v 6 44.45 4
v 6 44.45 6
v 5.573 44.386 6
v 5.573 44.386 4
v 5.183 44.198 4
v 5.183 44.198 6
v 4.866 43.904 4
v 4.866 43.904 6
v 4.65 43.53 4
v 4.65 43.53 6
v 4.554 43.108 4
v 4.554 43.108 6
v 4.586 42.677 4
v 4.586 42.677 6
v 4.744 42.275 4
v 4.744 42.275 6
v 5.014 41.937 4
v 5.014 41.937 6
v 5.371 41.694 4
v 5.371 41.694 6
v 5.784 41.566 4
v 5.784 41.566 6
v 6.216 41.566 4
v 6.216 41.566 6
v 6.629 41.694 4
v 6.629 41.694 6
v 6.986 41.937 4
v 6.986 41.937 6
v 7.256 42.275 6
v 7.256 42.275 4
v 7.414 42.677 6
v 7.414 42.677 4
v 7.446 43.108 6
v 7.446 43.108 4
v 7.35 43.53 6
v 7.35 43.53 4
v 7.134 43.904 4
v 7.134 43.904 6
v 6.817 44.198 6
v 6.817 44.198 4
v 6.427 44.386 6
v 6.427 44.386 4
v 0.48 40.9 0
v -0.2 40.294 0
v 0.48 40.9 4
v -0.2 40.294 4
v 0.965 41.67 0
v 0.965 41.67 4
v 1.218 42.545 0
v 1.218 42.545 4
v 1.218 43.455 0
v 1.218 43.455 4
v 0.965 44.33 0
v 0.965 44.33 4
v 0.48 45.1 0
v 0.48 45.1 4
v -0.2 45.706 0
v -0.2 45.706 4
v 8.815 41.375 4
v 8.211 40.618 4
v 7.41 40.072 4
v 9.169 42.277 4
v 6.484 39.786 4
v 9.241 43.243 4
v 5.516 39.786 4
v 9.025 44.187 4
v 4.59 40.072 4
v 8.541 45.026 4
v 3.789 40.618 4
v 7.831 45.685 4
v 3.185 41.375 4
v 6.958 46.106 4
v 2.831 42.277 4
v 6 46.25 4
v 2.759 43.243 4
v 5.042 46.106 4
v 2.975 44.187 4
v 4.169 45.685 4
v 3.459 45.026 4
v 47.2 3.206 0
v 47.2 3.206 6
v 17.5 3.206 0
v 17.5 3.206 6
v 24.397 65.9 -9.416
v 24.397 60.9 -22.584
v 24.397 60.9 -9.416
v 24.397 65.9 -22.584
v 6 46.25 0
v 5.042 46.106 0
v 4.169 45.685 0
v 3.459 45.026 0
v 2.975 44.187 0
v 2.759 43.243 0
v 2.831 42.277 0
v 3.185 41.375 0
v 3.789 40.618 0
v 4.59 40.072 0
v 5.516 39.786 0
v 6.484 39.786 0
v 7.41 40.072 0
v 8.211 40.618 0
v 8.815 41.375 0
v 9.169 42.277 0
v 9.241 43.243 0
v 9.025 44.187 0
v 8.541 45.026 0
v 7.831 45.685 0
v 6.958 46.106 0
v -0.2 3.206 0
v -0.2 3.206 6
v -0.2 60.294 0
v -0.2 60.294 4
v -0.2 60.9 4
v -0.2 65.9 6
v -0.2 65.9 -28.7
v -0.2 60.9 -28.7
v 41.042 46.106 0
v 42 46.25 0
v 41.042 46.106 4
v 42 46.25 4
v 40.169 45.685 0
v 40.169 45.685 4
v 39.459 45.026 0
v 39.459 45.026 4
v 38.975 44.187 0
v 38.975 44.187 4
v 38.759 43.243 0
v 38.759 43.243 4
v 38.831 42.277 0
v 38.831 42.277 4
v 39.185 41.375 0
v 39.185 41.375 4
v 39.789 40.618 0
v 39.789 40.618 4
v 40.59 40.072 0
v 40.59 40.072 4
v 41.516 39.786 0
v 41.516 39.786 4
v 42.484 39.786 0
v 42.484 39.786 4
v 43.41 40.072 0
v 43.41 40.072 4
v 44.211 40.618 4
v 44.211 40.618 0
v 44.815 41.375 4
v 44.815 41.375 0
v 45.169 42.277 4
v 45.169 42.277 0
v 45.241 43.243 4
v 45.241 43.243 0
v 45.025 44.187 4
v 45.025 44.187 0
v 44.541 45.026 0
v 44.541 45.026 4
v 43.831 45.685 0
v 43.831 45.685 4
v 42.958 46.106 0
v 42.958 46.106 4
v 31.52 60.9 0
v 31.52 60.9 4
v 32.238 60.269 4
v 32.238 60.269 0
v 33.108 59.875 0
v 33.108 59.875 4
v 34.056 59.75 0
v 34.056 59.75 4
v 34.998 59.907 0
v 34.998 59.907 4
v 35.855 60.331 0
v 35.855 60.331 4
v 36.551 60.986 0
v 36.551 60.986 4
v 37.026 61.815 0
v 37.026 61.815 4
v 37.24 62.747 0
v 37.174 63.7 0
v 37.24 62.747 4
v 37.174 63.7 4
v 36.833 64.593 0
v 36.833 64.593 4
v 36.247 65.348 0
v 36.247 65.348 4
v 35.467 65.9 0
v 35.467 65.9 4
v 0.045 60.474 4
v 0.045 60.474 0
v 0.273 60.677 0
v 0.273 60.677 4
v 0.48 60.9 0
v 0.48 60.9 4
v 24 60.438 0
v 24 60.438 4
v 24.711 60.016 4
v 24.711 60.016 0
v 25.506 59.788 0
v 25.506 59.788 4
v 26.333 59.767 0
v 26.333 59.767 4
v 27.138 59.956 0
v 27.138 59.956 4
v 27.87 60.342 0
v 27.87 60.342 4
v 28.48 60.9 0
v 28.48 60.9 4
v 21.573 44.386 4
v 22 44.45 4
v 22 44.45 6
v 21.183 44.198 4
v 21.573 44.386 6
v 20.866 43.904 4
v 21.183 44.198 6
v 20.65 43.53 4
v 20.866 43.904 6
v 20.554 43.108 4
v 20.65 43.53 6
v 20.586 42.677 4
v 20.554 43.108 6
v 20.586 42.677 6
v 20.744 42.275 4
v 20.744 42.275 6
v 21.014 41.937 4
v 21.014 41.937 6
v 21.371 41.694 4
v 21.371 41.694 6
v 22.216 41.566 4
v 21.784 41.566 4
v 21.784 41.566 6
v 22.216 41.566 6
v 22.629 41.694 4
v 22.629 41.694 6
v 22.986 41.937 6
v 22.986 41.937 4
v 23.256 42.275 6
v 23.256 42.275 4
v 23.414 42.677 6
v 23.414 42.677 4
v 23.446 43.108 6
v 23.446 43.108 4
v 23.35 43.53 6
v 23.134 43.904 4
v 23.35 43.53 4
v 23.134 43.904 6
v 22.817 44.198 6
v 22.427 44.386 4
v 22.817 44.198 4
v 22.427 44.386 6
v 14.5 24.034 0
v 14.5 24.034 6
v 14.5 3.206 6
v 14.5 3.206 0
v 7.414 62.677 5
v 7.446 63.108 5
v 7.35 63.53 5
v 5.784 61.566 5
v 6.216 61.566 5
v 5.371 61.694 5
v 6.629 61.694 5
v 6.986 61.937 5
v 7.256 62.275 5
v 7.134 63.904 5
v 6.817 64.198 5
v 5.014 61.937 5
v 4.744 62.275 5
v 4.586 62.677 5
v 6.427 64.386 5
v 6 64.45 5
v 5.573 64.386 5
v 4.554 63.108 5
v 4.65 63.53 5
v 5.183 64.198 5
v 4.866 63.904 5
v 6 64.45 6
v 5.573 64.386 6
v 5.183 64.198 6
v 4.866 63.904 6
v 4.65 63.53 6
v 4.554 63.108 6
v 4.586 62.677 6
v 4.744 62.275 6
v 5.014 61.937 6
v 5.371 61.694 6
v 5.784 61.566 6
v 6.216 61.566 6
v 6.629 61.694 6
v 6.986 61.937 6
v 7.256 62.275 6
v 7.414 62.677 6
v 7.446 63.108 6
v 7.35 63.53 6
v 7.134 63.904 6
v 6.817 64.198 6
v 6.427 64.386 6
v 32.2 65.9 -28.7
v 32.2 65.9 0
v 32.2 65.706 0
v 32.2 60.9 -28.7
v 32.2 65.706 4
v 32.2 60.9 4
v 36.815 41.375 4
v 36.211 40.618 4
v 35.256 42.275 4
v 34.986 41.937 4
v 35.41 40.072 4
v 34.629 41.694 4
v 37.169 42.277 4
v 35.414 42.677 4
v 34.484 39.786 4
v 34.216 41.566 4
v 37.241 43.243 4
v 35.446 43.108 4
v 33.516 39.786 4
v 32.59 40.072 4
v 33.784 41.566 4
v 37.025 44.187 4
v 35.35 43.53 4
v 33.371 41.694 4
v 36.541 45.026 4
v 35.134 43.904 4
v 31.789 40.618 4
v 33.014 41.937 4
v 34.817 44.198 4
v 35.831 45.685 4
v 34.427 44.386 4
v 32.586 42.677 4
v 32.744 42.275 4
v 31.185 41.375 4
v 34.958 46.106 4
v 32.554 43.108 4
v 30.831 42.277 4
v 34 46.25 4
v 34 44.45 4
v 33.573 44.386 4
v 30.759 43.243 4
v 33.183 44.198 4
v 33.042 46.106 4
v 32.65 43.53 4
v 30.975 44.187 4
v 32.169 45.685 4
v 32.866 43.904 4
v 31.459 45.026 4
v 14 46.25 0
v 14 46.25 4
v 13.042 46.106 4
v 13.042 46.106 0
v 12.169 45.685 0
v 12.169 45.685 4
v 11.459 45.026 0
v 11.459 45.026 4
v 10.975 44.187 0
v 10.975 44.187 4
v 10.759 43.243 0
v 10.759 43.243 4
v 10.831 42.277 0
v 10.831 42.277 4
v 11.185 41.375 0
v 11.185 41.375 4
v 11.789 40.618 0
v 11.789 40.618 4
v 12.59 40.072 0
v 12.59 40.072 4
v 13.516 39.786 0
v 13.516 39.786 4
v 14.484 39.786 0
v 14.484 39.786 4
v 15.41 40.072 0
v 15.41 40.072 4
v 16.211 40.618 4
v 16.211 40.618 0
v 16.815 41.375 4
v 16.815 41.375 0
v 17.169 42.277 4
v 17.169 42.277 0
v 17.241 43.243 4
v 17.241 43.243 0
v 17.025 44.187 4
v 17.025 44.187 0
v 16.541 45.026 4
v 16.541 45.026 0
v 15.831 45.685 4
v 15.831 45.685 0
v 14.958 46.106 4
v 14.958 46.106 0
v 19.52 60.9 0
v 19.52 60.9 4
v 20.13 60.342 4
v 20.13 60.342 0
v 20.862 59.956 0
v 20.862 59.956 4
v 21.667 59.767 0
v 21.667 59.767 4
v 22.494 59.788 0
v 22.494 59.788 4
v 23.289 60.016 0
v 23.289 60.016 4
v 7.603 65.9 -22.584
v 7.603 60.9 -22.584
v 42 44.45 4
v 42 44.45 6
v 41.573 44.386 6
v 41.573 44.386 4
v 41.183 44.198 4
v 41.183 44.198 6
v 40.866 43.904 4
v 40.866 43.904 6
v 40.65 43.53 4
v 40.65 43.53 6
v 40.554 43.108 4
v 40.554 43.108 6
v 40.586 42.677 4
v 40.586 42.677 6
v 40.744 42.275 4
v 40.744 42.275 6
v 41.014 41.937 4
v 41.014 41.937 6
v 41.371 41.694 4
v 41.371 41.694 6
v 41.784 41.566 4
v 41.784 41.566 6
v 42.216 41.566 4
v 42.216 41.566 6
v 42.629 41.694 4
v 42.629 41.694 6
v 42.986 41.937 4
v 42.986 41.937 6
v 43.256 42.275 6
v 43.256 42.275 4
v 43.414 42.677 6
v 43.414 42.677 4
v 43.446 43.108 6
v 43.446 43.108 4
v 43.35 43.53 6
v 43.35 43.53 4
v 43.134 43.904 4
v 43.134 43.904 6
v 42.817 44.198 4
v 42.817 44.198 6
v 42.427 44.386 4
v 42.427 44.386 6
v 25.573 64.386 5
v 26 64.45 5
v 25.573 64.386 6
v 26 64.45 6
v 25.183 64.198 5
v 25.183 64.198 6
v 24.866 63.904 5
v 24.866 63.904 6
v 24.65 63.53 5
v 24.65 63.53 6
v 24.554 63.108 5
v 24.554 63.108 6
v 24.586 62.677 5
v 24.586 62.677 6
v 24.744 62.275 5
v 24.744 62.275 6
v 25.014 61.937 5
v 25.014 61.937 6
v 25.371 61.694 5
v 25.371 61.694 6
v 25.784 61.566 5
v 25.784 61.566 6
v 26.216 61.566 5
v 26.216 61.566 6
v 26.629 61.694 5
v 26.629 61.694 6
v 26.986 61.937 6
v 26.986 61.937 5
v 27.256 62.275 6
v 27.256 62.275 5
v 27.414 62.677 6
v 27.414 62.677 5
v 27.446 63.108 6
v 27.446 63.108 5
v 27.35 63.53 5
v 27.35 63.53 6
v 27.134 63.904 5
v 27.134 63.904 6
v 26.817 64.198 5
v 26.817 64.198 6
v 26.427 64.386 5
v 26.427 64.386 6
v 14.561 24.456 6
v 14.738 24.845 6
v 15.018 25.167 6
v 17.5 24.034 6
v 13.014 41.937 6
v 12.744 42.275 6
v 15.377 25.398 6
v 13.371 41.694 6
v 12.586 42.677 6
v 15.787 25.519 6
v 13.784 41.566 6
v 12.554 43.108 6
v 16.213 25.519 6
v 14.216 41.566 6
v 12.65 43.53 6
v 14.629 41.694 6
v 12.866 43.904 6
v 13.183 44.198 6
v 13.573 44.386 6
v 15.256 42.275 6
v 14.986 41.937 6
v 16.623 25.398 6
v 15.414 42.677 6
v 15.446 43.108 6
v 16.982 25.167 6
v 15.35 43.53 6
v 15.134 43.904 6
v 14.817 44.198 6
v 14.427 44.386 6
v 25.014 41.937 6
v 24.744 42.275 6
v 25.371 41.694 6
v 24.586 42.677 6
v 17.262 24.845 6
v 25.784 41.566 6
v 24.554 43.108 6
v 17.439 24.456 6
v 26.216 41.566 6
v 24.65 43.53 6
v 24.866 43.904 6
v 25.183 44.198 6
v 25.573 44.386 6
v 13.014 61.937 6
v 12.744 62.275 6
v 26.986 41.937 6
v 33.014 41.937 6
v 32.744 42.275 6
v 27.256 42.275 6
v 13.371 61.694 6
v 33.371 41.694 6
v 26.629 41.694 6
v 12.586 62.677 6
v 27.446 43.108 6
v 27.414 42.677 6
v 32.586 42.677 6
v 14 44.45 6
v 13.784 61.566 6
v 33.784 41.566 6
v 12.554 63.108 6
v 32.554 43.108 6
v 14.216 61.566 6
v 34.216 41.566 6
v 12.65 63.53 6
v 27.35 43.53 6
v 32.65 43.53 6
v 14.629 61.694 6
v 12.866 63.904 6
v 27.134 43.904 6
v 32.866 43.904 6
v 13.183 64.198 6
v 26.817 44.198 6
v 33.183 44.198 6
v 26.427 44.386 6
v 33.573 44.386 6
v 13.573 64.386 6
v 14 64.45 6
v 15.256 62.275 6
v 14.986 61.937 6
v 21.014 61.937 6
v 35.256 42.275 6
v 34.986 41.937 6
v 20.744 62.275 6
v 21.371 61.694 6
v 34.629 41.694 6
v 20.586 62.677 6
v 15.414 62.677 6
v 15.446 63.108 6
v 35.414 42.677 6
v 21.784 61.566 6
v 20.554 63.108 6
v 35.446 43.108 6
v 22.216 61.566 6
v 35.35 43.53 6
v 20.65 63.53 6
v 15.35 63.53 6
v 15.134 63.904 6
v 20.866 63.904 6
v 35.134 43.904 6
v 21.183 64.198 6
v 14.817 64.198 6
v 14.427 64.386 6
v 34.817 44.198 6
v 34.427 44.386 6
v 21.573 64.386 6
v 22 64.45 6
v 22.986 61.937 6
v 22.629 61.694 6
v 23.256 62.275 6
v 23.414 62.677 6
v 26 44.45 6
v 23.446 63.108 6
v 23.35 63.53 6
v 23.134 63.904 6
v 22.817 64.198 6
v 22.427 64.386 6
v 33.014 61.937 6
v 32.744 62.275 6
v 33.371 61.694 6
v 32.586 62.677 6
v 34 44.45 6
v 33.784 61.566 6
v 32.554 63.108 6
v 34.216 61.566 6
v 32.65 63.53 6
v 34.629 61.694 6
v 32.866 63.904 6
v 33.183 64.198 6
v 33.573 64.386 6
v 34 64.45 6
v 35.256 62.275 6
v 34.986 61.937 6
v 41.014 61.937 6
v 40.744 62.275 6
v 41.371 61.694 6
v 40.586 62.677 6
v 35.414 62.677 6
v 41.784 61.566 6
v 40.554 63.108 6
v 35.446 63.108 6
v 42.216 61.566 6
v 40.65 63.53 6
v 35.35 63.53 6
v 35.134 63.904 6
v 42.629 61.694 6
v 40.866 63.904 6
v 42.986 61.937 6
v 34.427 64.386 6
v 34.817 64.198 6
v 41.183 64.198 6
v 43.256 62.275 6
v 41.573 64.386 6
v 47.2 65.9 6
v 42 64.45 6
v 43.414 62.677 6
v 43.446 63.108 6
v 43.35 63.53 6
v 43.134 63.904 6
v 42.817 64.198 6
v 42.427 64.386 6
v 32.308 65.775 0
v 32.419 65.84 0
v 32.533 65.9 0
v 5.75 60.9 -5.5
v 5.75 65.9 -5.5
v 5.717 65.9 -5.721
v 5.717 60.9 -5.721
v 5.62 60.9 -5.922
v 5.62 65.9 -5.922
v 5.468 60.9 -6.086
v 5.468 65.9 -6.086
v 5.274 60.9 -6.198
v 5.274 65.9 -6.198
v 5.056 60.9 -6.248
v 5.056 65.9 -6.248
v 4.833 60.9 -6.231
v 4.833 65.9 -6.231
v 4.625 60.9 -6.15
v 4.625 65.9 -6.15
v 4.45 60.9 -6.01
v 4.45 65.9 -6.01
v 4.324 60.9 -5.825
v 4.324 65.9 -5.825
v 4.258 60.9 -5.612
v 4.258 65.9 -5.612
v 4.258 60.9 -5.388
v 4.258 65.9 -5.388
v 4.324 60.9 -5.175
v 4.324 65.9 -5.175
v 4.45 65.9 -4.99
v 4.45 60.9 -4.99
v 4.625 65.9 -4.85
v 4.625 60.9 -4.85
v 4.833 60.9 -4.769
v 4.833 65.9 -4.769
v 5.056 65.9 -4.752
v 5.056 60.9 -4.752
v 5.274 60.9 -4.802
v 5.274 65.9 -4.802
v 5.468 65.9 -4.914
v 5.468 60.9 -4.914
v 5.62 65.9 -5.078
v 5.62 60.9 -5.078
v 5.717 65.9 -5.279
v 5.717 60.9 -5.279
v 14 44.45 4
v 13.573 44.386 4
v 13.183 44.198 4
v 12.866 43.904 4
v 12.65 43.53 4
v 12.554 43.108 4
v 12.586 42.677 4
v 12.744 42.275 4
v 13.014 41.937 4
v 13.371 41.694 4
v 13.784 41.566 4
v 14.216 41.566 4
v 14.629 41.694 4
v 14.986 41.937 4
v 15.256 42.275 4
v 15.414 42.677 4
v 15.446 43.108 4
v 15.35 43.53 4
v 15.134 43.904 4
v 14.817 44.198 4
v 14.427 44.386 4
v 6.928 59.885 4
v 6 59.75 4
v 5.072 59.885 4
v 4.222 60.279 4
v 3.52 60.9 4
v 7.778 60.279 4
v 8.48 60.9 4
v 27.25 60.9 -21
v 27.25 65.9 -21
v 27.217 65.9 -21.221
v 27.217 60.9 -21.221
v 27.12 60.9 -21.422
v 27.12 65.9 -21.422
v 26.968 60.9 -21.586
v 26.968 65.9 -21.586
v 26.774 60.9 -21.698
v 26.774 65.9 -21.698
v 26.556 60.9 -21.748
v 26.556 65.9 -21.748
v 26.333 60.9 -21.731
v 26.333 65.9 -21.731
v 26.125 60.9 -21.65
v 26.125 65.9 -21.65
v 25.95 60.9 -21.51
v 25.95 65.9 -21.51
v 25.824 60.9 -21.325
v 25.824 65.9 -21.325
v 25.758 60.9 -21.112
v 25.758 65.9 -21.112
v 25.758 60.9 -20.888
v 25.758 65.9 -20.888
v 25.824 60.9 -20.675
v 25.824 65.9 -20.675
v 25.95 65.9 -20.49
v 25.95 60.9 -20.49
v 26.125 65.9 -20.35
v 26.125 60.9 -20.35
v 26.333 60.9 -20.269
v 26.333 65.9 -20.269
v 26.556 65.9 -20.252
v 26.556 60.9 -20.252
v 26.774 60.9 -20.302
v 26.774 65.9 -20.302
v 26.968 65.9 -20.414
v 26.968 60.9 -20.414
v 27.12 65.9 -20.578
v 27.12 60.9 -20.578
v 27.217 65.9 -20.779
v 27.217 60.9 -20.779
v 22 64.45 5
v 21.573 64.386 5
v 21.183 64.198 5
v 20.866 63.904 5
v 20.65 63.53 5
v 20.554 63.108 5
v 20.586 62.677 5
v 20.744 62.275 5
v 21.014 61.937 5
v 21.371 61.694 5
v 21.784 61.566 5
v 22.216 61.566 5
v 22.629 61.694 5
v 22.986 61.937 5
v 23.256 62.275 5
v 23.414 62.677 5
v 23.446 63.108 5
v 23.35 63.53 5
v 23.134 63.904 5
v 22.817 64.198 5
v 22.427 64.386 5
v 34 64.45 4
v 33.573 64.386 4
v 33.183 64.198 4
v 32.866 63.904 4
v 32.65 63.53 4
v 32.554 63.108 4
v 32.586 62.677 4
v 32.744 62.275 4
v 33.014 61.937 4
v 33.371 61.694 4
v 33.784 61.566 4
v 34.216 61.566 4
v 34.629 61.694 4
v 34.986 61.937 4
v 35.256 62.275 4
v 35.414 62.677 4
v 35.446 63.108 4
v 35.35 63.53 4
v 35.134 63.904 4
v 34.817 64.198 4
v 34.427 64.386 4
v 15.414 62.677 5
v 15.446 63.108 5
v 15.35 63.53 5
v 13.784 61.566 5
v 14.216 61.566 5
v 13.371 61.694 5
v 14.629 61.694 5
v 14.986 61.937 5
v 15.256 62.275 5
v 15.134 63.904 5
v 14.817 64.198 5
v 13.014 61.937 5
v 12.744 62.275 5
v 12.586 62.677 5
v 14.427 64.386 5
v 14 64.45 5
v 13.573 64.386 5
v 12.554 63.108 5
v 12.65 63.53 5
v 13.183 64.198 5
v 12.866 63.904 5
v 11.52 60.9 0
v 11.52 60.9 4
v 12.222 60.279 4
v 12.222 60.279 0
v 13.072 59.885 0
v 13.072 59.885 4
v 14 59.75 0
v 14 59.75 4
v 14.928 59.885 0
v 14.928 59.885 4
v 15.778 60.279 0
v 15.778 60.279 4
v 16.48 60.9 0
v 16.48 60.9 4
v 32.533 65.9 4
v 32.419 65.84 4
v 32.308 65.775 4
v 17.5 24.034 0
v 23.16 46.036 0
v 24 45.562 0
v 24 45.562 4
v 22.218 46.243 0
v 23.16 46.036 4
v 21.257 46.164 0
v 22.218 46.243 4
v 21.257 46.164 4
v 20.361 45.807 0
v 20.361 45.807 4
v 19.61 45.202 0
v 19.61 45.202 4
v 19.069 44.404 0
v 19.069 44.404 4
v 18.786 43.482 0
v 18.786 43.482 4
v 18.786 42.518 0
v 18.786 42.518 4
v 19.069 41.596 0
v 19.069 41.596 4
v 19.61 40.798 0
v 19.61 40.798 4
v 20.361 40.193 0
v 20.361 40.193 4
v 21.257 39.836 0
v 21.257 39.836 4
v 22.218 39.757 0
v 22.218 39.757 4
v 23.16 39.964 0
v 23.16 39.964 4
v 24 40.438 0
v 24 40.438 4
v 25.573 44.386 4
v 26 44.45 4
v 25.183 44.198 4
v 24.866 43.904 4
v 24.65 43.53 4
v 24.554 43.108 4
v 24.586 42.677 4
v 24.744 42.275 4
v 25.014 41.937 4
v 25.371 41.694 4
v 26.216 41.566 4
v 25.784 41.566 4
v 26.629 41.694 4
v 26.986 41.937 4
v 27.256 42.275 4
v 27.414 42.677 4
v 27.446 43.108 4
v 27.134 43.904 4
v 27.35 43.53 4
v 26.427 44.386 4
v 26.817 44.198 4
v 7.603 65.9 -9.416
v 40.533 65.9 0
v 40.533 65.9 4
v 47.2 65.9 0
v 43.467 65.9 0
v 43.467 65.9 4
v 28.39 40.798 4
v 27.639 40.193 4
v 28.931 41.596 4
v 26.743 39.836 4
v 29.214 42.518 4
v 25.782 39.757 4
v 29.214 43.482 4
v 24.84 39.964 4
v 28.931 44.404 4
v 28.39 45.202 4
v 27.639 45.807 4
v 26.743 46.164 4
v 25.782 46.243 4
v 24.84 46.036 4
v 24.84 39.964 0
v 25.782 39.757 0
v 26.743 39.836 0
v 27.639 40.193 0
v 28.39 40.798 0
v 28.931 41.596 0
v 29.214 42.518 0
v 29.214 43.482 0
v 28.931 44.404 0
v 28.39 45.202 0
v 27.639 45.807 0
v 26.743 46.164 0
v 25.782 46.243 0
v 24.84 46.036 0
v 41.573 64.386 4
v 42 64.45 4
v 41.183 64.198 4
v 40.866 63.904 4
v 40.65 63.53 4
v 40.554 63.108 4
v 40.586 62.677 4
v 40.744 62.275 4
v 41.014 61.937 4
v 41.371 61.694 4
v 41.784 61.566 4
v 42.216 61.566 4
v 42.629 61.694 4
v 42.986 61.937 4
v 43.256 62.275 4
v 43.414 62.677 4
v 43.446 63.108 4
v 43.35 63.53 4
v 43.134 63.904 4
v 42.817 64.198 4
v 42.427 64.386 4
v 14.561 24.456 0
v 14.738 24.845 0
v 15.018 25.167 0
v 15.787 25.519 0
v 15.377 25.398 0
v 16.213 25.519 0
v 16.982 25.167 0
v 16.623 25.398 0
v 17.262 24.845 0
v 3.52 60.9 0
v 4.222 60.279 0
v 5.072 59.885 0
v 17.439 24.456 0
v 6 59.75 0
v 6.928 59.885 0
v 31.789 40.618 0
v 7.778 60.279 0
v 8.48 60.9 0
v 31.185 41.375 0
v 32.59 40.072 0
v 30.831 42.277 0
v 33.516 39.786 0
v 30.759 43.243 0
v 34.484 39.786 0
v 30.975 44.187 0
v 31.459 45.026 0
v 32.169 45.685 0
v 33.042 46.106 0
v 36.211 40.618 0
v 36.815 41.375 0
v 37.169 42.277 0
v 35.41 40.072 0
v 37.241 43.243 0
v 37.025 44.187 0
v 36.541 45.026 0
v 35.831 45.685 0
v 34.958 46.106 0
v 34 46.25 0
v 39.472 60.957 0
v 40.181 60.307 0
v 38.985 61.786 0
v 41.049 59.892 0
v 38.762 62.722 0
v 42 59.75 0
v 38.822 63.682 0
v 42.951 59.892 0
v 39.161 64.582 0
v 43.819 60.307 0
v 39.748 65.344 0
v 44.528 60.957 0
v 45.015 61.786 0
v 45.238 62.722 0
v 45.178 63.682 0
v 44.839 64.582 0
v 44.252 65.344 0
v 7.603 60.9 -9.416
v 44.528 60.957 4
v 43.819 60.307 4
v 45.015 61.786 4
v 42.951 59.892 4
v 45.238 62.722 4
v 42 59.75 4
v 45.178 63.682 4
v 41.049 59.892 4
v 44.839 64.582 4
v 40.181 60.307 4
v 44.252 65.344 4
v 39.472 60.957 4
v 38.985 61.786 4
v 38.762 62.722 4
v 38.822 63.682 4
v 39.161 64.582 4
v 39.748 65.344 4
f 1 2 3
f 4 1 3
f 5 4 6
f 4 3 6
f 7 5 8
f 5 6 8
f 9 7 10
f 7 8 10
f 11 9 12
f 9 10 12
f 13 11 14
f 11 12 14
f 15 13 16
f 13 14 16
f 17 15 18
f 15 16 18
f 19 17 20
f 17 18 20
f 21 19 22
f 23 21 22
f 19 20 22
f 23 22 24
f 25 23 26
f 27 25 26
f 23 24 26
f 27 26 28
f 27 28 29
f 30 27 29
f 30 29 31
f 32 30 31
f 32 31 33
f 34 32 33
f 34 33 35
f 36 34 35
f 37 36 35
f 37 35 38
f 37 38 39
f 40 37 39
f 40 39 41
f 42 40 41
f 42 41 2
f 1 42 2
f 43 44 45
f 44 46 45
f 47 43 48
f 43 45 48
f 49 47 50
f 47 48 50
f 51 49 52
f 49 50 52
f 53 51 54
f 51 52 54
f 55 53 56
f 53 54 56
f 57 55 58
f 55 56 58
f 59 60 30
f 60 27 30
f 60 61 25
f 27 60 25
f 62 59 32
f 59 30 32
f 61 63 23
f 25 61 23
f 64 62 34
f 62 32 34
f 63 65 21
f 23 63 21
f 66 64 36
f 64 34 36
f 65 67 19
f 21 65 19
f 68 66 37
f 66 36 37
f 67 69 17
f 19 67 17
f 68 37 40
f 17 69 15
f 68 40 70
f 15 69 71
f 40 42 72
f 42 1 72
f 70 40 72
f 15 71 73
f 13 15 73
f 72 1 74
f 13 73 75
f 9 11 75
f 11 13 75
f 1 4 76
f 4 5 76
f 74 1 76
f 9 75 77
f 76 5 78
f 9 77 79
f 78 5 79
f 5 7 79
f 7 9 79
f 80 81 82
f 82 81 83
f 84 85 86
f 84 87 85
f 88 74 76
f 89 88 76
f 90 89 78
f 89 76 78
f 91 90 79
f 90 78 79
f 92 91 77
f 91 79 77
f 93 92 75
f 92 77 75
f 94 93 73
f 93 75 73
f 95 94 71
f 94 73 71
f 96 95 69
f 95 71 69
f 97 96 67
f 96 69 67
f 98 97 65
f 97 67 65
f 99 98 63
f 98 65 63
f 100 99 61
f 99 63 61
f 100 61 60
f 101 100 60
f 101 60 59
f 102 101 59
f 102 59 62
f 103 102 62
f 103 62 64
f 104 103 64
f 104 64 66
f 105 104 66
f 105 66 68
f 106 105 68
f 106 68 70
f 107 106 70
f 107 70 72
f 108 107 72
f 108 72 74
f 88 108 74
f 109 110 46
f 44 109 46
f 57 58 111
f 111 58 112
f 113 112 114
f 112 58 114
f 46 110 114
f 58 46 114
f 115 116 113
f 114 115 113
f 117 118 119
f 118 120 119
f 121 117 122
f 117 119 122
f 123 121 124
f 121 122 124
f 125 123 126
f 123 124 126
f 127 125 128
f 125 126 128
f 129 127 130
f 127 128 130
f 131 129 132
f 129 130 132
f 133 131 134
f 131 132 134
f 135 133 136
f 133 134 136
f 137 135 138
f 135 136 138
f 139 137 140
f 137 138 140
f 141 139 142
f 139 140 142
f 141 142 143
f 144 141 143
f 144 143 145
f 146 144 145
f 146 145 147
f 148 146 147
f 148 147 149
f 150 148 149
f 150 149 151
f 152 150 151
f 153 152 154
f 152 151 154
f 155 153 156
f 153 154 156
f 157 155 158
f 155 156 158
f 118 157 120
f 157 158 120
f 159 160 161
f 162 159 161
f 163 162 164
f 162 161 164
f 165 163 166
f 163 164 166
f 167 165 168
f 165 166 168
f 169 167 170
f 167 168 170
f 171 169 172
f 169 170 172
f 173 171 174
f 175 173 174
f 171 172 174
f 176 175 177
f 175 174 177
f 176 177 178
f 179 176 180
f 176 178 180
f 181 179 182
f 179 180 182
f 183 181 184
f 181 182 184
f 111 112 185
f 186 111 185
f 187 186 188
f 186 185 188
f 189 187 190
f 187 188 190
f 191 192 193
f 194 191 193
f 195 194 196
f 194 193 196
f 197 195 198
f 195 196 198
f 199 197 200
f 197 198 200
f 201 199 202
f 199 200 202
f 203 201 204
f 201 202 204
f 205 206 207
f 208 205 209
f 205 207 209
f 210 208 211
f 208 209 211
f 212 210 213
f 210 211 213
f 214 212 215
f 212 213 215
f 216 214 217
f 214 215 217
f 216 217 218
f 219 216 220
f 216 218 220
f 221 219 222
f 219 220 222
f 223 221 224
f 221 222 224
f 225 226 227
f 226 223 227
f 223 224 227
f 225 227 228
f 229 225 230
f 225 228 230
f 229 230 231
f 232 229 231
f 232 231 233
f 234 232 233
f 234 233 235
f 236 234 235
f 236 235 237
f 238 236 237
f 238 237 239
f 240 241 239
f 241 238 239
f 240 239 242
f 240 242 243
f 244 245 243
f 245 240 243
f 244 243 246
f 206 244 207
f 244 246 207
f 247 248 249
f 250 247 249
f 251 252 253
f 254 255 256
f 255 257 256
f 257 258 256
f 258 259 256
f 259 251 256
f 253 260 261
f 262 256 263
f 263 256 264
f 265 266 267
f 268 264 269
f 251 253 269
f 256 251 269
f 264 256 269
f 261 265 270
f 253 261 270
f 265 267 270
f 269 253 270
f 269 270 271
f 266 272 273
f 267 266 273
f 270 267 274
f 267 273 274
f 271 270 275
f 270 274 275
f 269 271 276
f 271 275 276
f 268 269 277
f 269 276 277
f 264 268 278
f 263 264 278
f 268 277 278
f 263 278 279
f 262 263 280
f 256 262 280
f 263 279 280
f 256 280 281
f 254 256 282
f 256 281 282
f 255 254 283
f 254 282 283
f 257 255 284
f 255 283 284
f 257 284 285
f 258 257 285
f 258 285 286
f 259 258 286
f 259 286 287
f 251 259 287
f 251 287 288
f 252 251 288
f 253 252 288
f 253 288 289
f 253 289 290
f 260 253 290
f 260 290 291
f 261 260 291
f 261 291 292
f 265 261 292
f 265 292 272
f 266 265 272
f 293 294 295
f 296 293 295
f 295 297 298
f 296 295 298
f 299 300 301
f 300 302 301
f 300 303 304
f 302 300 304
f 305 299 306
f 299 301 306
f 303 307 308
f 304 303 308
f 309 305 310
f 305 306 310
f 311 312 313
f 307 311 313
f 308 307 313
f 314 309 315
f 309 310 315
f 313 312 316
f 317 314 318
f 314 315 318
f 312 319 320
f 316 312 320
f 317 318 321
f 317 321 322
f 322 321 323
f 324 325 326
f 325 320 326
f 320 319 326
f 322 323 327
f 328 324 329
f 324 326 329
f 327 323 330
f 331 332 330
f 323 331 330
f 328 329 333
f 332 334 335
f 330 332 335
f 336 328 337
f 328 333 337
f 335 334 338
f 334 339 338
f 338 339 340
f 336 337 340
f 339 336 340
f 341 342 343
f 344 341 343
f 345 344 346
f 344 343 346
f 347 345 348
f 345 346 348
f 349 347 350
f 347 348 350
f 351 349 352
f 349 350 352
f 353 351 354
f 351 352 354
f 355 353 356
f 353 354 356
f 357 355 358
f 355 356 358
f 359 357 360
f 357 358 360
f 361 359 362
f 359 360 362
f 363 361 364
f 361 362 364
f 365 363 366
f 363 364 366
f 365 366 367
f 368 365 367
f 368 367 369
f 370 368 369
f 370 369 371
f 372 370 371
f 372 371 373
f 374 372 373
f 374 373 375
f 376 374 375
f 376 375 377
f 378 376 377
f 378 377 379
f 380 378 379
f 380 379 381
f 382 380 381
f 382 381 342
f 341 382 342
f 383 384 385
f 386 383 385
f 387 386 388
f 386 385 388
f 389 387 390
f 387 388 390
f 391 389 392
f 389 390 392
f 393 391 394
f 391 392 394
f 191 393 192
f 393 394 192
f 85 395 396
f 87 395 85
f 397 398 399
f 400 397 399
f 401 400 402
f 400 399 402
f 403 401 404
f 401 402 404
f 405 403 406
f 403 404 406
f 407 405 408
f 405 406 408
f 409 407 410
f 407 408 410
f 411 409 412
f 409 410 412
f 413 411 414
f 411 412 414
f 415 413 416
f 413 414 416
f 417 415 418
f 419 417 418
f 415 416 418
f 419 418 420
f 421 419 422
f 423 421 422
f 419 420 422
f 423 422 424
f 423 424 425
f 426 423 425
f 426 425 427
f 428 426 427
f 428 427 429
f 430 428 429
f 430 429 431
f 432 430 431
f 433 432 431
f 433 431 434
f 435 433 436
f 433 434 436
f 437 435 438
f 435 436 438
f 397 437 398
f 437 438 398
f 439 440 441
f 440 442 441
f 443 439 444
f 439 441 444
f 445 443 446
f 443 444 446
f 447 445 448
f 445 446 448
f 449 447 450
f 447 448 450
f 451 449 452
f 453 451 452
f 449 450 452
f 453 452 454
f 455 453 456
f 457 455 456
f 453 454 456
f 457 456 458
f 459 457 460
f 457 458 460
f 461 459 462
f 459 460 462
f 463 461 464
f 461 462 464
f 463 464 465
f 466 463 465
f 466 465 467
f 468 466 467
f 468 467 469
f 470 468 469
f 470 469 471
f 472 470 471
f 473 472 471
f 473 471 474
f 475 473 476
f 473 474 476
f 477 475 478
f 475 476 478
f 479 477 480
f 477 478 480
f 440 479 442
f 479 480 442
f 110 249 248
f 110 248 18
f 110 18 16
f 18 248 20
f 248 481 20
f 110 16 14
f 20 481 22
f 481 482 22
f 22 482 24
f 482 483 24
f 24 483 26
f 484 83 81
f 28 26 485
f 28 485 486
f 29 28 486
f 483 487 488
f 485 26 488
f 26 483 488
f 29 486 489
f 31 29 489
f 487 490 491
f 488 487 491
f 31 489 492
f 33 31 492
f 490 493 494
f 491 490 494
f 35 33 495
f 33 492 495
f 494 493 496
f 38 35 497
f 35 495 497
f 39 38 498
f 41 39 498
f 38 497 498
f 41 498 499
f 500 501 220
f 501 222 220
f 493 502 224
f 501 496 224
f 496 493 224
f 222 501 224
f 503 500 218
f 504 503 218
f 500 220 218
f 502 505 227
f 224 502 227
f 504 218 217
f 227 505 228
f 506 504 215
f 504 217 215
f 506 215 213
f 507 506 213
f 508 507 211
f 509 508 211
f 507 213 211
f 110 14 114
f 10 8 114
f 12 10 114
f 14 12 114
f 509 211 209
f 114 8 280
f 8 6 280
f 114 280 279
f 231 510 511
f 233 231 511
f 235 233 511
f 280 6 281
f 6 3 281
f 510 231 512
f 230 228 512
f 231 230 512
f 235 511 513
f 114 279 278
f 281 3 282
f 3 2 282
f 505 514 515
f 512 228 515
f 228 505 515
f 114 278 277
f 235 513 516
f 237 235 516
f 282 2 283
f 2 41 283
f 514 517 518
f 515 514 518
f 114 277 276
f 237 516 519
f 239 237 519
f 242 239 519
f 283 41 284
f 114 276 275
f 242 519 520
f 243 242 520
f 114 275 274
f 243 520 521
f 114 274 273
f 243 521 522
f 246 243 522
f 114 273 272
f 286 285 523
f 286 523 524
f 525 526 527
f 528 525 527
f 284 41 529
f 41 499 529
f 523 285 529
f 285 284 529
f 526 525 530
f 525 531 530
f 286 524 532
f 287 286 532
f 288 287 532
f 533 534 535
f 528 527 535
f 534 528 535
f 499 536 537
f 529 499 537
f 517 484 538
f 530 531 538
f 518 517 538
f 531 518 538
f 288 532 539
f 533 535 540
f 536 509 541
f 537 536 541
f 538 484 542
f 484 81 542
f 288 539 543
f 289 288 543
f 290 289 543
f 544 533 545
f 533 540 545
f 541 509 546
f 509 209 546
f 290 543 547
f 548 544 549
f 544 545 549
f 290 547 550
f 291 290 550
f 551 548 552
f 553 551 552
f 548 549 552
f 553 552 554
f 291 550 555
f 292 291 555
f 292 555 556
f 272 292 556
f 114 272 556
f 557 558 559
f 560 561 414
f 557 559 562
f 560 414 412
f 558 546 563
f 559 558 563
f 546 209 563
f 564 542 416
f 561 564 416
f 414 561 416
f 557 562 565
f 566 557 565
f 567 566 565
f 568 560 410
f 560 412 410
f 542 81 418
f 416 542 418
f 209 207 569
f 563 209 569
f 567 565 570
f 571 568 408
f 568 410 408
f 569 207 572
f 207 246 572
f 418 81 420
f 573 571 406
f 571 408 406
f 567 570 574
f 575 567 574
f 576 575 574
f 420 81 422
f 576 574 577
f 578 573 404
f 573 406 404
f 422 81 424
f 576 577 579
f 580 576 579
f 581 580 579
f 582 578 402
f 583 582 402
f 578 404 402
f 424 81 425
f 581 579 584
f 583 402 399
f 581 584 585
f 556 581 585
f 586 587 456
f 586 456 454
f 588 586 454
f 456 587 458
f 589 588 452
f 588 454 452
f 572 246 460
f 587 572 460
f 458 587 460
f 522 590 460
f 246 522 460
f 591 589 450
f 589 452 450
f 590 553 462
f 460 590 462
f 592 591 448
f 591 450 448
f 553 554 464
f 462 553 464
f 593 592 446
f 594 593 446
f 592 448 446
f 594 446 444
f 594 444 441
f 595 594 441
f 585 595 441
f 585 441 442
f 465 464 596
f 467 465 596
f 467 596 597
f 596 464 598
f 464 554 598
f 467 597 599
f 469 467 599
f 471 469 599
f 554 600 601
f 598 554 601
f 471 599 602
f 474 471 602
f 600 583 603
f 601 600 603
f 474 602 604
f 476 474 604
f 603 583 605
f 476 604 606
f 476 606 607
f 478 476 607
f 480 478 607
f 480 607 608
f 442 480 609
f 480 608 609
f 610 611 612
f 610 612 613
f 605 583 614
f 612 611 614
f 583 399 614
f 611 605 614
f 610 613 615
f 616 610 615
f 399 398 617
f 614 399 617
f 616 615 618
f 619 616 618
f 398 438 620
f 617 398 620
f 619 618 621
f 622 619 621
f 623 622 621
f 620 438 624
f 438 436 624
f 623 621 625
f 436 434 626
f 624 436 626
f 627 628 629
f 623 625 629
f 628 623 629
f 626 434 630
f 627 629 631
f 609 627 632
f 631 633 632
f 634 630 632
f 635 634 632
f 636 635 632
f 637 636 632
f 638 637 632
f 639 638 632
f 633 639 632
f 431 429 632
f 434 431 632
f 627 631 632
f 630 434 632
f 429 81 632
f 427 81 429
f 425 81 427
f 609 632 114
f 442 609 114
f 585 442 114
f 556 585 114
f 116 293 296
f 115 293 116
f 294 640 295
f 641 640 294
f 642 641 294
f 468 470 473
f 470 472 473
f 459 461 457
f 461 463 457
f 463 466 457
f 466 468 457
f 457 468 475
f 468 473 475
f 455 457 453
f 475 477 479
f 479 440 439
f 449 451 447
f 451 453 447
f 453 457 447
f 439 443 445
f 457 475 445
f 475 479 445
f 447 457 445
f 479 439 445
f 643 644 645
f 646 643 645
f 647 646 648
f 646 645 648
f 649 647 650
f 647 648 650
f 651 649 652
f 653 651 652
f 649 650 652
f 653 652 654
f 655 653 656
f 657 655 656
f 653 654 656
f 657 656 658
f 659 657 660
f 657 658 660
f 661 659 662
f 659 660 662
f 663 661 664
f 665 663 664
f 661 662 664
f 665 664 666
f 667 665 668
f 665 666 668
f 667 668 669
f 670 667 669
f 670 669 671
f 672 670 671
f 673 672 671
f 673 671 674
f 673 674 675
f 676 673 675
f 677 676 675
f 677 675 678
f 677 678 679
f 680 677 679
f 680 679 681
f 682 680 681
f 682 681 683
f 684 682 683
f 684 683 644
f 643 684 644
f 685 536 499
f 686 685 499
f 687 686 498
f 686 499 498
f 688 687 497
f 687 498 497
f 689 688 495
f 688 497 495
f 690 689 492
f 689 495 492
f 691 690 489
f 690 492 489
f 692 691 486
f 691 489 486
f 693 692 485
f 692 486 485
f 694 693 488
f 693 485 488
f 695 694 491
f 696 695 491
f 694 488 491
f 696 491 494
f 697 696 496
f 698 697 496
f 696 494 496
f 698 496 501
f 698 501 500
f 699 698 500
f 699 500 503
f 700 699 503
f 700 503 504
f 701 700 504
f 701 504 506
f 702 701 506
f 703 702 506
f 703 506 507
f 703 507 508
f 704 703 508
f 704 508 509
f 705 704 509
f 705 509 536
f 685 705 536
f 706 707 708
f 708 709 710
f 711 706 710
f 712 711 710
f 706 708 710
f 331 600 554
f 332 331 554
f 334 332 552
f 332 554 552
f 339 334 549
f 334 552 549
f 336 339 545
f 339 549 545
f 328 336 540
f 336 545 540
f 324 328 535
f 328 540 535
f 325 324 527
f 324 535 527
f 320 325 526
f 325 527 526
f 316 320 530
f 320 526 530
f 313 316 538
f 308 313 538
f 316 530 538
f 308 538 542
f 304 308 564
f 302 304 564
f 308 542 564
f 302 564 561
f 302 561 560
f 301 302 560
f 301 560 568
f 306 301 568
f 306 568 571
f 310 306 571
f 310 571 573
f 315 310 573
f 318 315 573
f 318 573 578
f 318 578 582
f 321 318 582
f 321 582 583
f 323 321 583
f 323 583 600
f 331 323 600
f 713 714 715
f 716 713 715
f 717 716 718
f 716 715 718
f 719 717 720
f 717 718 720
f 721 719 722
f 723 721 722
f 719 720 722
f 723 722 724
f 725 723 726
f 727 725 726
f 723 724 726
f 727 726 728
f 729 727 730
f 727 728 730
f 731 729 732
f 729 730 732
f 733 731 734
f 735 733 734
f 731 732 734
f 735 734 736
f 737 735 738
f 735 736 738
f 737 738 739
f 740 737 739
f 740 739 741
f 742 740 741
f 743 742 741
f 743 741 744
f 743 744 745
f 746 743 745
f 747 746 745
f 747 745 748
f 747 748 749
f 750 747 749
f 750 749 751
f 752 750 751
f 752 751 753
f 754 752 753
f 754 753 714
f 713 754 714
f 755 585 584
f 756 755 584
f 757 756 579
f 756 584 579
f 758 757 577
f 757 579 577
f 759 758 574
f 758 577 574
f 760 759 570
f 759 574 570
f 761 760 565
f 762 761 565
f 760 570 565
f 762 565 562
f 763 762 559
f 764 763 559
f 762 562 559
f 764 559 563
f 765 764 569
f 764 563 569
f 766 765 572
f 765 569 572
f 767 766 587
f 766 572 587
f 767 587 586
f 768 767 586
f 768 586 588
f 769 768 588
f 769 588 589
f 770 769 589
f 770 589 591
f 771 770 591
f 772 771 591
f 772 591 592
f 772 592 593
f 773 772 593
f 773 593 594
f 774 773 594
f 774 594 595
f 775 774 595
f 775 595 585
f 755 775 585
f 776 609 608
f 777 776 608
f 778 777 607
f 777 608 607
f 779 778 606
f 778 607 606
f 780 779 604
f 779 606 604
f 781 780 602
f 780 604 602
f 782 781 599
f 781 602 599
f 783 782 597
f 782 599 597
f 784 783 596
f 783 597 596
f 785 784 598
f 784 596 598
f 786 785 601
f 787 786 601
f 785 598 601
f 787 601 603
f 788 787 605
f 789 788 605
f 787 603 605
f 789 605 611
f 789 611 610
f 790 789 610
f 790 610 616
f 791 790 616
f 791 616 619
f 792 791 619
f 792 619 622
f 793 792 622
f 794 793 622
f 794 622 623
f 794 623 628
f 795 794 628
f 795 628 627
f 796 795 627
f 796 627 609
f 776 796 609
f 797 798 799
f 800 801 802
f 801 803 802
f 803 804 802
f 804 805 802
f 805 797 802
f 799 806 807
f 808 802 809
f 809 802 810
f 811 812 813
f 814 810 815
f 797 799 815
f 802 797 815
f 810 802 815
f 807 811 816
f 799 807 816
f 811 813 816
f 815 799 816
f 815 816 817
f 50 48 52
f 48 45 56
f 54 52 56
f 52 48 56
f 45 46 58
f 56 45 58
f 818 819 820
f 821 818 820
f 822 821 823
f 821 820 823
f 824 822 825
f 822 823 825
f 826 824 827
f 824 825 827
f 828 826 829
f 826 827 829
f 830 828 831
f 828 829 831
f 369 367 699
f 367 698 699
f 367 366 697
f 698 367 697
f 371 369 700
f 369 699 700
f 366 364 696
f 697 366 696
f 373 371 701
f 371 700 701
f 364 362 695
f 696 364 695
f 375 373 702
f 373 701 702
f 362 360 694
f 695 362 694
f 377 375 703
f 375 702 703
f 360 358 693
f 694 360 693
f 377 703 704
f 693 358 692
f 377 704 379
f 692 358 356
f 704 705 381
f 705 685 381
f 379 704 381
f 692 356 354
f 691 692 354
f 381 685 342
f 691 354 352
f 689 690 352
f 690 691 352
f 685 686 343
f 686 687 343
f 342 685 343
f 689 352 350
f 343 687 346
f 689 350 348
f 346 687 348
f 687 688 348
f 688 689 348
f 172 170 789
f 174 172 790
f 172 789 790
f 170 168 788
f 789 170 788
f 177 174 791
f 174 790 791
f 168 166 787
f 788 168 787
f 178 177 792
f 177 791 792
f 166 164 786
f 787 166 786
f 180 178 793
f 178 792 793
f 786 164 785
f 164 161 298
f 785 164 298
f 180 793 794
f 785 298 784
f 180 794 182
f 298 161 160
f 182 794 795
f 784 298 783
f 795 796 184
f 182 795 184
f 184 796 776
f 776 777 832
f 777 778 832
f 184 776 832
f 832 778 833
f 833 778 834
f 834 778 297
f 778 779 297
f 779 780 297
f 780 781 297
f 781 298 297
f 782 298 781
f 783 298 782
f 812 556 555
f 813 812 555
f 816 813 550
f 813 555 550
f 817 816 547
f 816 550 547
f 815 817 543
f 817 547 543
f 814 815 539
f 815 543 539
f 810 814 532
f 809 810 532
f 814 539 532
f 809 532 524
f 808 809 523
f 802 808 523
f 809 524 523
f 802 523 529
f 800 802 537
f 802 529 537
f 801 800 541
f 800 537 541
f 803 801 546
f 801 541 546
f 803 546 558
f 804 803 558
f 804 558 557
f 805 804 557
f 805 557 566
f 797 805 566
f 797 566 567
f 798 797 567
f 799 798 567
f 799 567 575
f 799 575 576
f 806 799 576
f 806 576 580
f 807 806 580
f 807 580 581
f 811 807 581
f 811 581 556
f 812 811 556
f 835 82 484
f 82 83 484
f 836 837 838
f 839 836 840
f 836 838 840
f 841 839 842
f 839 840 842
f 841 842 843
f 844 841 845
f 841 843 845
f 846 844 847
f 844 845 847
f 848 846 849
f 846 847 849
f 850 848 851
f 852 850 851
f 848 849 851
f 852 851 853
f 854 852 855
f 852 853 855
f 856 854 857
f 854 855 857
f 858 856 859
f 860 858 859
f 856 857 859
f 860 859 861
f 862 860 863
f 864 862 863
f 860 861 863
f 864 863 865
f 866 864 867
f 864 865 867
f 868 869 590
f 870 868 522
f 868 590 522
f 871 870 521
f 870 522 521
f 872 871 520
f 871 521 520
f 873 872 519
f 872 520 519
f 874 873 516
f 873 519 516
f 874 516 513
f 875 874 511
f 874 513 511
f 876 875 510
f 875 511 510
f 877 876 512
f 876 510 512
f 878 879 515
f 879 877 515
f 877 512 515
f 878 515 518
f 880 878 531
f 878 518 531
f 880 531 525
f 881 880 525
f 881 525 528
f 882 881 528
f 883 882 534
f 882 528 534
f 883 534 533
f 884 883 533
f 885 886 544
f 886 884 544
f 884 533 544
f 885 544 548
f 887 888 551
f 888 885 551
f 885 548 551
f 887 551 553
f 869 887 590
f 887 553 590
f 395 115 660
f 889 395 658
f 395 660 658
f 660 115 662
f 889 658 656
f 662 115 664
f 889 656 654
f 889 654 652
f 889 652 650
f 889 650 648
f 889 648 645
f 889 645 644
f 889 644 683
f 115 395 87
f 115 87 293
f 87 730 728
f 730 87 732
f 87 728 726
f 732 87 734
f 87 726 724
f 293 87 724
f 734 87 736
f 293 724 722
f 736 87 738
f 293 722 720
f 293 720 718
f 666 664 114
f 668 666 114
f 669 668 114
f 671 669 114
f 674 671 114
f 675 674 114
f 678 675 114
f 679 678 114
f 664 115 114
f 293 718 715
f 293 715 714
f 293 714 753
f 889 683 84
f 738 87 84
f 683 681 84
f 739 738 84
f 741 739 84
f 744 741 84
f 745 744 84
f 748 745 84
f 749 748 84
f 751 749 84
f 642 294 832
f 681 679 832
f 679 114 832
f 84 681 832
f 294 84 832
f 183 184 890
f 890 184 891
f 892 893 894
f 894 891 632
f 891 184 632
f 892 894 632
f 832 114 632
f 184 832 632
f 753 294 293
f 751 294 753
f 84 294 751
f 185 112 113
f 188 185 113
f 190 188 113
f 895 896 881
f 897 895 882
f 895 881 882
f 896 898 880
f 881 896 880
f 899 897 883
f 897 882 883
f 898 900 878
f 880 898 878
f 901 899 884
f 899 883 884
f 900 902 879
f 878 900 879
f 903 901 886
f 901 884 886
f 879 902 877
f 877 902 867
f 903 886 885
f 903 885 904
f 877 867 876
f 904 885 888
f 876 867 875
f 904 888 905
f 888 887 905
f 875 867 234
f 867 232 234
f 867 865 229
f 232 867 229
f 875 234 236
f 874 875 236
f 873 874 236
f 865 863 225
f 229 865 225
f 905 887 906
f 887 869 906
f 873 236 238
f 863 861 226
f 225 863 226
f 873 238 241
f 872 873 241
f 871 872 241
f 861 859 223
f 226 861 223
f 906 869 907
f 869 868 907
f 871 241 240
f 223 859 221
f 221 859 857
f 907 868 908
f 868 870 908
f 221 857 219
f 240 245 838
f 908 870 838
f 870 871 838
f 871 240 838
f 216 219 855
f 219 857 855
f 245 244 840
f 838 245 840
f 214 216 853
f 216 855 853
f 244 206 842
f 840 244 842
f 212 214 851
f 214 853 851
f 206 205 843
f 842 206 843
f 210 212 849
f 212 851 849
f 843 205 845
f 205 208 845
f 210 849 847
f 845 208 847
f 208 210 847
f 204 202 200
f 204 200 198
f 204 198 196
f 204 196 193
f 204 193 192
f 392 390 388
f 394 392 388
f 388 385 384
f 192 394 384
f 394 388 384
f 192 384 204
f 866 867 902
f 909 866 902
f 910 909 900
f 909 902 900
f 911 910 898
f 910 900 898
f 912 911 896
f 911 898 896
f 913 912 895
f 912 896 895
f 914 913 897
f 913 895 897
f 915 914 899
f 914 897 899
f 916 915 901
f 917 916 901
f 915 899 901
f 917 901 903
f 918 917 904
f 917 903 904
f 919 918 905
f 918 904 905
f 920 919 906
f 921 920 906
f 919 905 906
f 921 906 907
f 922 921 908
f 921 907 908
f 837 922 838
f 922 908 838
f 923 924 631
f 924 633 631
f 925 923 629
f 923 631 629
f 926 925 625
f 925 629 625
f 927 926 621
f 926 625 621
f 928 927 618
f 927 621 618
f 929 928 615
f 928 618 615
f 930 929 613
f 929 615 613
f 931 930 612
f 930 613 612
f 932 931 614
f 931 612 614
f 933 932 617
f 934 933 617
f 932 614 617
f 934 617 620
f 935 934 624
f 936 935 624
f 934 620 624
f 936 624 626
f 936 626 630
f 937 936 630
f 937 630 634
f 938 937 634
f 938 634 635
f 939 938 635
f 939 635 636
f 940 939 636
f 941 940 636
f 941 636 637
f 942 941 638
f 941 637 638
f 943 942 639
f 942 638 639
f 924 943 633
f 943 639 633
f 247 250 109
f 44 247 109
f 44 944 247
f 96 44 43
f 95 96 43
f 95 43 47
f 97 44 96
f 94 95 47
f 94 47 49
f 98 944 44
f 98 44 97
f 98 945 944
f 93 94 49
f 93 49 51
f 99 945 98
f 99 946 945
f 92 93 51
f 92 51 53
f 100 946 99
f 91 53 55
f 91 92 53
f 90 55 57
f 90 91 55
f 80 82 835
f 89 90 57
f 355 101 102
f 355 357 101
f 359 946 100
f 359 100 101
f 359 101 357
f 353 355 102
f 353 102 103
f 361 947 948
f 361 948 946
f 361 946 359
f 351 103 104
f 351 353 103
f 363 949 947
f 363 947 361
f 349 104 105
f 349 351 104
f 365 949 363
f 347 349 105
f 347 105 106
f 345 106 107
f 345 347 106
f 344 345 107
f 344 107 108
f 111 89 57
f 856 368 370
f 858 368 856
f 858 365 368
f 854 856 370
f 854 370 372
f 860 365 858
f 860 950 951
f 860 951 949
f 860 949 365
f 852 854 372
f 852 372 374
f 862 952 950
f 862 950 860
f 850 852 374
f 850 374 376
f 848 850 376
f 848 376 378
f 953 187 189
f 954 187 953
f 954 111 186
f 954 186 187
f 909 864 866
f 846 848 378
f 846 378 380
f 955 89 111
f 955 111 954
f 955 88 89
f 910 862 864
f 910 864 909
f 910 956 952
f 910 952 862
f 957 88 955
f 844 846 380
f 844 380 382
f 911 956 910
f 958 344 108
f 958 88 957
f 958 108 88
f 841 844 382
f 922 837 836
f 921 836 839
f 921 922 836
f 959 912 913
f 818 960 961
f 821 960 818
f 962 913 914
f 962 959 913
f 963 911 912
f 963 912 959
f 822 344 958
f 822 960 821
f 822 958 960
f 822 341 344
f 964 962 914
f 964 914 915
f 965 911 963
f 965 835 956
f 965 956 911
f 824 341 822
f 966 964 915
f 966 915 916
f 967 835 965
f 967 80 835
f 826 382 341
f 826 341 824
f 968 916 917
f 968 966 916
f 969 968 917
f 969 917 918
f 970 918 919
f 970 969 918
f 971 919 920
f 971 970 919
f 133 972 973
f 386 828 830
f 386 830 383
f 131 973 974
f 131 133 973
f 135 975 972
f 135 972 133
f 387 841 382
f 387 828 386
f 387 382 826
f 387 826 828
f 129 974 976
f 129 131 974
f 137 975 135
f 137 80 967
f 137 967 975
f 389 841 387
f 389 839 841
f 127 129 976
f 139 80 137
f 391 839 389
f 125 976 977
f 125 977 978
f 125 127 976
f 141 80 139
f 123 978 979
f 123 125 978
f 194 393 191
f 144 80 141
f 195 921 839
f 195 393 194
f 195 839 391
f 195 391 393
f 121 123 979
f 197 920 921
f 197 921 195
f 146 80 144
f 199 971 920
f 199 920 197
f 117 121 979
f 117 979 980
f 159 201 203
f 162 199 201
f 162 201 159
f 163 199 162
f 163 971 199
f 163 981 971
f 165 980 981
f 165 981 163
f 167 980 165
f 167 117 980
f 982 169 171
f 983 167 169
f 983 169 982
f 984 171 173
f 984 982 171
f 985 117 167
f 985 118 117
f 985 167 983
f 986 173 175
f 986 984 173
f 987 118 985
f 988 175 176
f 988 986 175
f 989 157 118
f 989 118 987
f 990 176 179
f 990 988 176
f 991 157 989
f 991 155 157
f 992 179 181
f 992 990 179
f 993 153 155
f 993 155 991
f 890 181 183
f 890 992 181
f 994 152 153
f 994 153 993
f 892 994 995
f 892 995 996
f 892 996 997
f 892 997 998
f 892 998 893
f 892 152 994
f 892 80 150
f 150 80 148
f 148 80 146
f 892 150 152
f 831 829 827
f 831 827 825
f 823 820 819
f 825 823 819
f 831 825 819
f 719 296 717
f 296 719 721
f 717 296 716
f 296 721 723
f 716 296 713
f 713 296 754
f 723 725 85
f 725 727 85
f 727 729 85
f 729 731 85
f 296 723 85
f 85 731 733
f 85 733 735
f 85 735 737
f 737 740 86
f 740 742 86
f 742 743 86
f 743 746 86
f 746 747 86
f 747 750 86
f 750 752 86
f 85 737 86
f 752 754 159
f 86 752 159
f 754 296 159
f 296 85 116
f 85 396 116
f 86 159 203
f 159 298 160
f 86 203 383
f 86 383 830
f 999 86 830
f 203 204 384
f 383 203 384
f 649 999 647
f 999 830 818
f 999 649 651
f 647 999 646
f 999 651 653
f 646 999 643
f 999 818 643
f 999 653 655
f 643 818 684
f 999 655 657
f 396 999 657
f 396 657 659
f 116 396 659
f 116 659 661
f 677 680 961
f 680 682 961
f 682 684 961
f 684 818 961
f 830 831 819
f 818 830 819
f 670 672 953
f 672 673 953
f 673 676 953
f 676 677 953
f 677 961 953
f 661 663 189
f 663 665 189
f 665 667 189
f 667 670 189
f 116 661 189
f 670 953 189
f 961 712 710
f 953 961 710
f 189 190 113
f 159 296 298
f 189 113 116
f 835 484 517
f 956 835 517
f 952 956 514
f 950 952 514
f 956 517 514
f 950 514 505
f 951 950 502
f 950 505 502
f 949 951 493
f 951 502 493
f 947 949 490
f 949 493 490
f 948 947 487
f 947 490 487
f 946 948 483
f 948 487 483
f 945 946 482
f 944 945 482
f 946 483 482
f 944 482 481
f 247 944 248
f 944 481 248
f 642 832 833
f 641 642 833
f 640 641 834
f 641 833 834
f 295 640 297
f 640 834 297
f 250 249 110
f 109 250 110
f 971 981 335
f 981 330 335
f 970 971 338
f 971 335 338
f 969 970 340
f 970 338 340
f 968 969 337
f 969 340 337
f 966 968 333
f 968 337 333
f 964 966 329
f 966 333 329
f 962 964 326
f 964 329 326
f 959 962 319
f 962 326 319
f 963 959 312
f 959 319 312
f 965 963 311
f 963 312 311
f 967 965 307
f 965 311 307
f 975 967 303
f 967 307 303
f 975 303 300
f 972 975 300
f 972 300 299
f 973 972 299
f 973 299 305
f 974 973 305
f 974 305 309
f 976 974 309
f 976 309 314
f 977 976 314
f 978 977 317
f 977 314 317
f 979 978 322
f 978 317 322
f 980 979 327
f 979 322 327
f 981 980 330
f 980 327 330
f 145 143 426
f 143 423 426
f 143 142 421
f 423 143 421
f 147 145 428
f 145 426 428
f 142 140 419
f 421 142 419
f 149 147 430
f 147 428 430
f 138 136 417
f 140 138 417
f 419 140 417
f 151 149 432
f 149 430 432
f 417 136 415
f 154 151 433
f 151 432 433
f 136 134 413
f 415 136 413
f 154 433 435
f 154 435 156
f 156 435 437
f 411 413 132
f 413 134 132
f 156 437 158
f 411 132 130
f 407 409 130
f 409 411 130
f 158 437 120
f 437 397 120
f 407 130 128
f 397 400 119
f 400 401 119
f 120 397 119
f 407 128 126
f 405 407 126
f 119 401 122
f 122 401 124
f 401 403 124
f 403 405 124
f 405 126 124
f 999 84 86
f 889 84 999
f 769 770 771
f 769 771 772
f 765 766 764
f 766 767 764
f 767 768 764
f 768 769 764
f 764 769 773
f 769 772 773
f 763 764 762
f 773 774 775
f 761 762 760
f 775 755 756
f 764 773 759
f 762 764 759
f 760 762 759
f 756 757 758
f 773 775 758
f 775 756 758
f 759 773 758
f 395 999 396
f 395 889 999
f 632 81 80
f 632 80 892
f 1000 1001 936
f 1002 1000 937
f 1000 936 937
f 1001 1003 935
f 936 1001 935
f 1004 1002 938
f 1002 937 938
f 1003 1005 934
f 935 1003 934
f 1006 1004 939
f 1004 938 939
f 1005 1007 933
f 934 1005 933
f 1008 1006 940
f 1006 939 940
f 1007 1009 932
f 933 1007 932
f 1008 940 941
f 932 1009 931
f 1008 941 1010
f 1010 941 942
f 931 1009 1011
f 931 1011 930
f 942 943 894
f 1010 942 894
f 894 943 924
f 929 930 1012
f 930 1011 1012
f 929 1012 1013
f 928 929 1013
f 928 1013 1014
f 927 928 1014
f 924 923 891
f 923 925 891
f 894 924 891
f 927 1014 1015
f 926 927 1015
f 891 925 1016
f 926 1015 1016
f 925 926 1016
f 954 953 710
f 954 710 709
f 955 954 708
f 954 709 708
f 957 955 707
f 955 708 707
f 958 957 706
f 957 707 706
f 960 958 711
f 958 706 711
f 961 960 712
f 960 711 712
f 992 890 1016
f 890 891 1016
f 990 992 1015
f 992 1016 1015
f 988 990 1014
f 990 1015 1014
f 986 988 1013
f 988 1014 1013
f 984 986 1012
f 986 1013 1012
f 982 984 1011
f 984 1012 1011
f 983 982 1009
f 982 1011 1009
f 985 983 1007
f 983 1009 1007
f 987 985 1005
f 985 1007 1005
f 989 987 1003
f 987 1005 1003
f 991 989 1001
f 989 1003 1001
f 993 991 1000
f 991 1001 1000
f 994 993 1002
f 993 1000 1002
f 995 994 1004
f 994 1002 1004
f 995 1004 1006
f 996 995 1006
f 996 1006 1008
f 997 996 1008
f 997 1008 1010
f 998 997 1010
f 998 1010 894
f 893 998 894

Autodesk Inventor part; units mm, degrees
ref_plane "YZ Plane" through (0, 0, 0) normal (1, 0, 0) x (0, 1, 0)
ref_plane "XZ Plane" through (0, 0, 0) normal (0, 1, 0) x (-1, 0, 0)
ref_plane "Work Plane1" through (22.2, 37.1, 6) normal (0, 0, -1) x (0, 1, 0)
ref_plane "Work Plane2" through (0, 0, 0) normal (0, 0, 1) x (1, 0, 0)
sketch "Sketch1" plane through (22.2, 37.1, 6) normal (0, 0, -1) x (0, 1, 0)
  circle A0 centre (25.9, 3.8) radius 1.75
  circle A1 centre (25.9, -16.2) radius 1.75
  circle A2 centre (5.9, 3.8) radius 1.75
  circle A3 centre (5.9, -16.2) radius 1.5
  line L0 (3, -22.4) -> (9.5, -22.4) construction
  line L1 (9.5, 10) -> (9.5, -22.4) construction
  line L2 (3, 10) -> (9.5, 10) construction
  line L3 (3, 10) -> (3, -22.4) construction
  circle A4 centre (5.9, 3.8) radius 1.75 construction
  circle A5 centre (5.9, -16.2) radius 1.75 construction
  line L4 (28.8, -22.4) -> (21.9, -22.4) construction
  line L5 (21.9, 10) -> (21.9, -22.4) construction
  line L6 (28.8, 10) -> (21.9, 10) construction
  line L7 (28.8, 10) -> (28.8, -22.4) construction
  line L8 (19.9, 3.8) -> (19.9, -14.6723) construction
  line L9 (28.8, 10) -> (-33.8945, 10)
  line L10 (-33.8945, 10) -> (-33.8945, -22.4)
  line L11 (-33.8945, -22.4) -> (28.8, -22.4)
  line L12 (28.8, -22.4) -> (28.8, 10)
  line L13 (-33.8945, -22.4) -> (28.8, -22.4)
  line L14 (28.8, -22.4) -> (28.8, -37.4)
  line L15 (28.8, -37.4) -> (-33.8945, -37.4)
  line L16 (-33.8945, -37.4) -> (-33.8945, -22.4)
  line L17 (28.8, 10) -> (-33.8945, 10)
  line L18 (-33.8945, 10) -> (-33.8945, 25)
  line L19 (-33.8945, 25) -> (28.8, 25)
  line L20 (28.8, 25) -> (28.8, 10)
  line L21 (28.8, 25) -> (-33.8945, 10)
  point P0 (-37.1, -22.2)
  point P1 (28.8, -22.4)
extrude "Extrusion1" add sketch "Sketch1" along normal up to surface (6 mm away) contours A0 | A1 | A2 | A3 | L12 L11 L10 L9 | L9 L21 L20 | L18 L19 L21
sketch "Sketch2" plane through (22.2, 37.1, 6) normal (0, 0, 1) x (1, 0, 0)
  line L0 (10, 28.8) -> (10, -33.8945) projected
  circle A0 centre (-6.2, -29.1) radius 1.4 projected
  line L1 (-6.2, -54.7229) -> (-6.2, -13.0662) construction
  line L2 (10, -33.8945) -> (-22.4, -33.8945) projected
  line L3 (-4.7, -54.7229) -> (-4.7, -13.0662)
  line L4 (-7.7, -13.0662) -> (-7.7, -54.7229)
  arc A1 (-7.7, -54.7229) -> (-4.7, -54.7229) centre (-6.2, -54.7229) ccw
  arc A2 (-4.7, -13.0662) -> (-7.7, -13.0662) centre (-6.2, -13.0662) ccw
  line L5 (10, -33.8945) -> (-37.4, -33.8945) projected
  line L6 (-37.4, 28.8) -> (10, 28.8) projected
  line L7 (-37.4, -33.8945) -> (-37.4, 28.8) projected
  point P0 (-22.2, -37.1)
  point P1 (-6.2, -33.8945)
  dimension "d2" = 3
extrude "Extrusion2" cut sketch "Sketch2" against normal blind 10 contours L3 A1 L4 L2 | L2 L4 A2 L3 | A0
sketch "Sketch3" plane through (32.2, 65.9, 0) normal (0, 0, -1) x (-1, 0, 0)
  circle A0 centre (6.2, -22.9) radius 1.25 projected
  circle A1 centre (26.2, -22.9) radius 1.25 projected
  circle A2 centre (26.2, -2.9) radius 1.25 projected
  circle A3 centre (6.2, -2.9) radius 1.25 projected
  line L0 (47.4, 0) -> (0, 0) projected
  point P0 (32.2, -65.9)
  point P1 (14.2, -22.9)
  point P2 (34.2, -22.9)
  point P3 (34.2, -2.9)
  point P4 (14.2, -2.9)
  point P5 (22.2, -22.9)
  point P6 (42.2, -22.9)
  point P7 (42.2, -2.9)
  point P8 (22.2, -2.9)
  dimension "d22" = 8
hole "Hole1" at (6, 63, 0) at (26, 63, 0) at (26, 43, 0) at (6, 43, 0) at (-10, 43, 0) at (-2, 43, 0) at (-2, 63, 0) at (-10, 63, 0) direction (0, 0, 1) diameter 2.9 end through all counterbore diameter 6.5 counterbore depth 4
ref_plane "Work Plane3" through (0.2759, 57, -15.7452) normal (0, -1, 0) x (-0.9087, 0, 0.4175)
sketch "Sketch4" plane through (32.2, 3.2055, 0) normal (0, 0, -1) x (-1, 0, 0)
  line L0 (41.88, 53.7945) -> (-24.48, 53.7945) projected
  line L1 (32.4, 0) -> (32.4, 37.0885) projected
  line L2 (0, 62.6945) -> (0, 0) projected
  line L3 (32.4, 53.7945) -> (0, 53.7945)
  line L4 (0, 53.7945) -> (0, 49.2945)
  line L5 (0, 49.2945) -> (32.4, 49.2945)
  line L6 (32.4, 49.2945) -> (32.4, 53.7945)
  line L7 (32.4, 62.6945) -> (-15, 62.6945) projected
  line L8 (32.4, 62.6945) -> (0, 62.6945)
  line L9 (0, 62.6945) -> (0, 57.6945)
  line L10 (0, 57.6945) -> (32.4, 57.6945)
  line L11 (32.4, 57.6945) -> (32.4, 62.6945)
  point P0 (32.2, -3.2055)
  point P1 (26.2, 47.7945)
  point P2 (32.4, 49.2945)
  point P3 (0, 53.7945)
  point P4 (0, 53.7945)
  dimension "d12" = 4.5
  dimension "d31" = 5
pattern_linear "Rechteckige Anordnung1" count 3 spacing 8 along (1, 0, 0) of "Hole1"
extrude "Extrusion3" add sketch "Sketch4" along normal blind 28.7 and the other way blind 5 contours L2 L7 L11 L10
sketch "Sketch5" plane through (-0.2, 65.9, 0) normal (0, 1, 0) x (1, 0, 0)
  circle A0 centre (-1.3, 26) radius 1 projected
  circle A1 centre (26.7, 21) radius 1 construction
  circle A2 centre (5.2, 5.5) radius 1 construction
  circle A3 centre (16.2, 16) radius 2.6486 projected
  line L0 (24.5969, 9.4163) -> (7.8031, 9.4163)
  line L1 (7.8031, 9.4163) -> (7.8031, 22.5837)
  line L2 (7.8031, 22.5837) -> (24.5969, 22.5837)
  line L3 (24.5969, 22.5837) -> (24.5969, 9.4163)
  line L4 (24.5969, 9.4163) -> (7.8031, 22.5837) construction
  line L5 (7.8031, 9.4163) -> (24.5969, 22.5837) construction
  circle A4 centre (26.7, 21) radius 0.75
  circle A5 centre (5.2, 5.5) radius 0.75
  point P0 (0.2, 0)
  dimension "d15" = 1.5
  dimension "d16" = 1.5
extrude "Extrusion4" cut sketch "Sketch5" against normal blind 10 contours A3 | L0 L1 L2 L3 | A4 | A5
properties part number "30_cellSTORM_UC2_Laser_holder"
